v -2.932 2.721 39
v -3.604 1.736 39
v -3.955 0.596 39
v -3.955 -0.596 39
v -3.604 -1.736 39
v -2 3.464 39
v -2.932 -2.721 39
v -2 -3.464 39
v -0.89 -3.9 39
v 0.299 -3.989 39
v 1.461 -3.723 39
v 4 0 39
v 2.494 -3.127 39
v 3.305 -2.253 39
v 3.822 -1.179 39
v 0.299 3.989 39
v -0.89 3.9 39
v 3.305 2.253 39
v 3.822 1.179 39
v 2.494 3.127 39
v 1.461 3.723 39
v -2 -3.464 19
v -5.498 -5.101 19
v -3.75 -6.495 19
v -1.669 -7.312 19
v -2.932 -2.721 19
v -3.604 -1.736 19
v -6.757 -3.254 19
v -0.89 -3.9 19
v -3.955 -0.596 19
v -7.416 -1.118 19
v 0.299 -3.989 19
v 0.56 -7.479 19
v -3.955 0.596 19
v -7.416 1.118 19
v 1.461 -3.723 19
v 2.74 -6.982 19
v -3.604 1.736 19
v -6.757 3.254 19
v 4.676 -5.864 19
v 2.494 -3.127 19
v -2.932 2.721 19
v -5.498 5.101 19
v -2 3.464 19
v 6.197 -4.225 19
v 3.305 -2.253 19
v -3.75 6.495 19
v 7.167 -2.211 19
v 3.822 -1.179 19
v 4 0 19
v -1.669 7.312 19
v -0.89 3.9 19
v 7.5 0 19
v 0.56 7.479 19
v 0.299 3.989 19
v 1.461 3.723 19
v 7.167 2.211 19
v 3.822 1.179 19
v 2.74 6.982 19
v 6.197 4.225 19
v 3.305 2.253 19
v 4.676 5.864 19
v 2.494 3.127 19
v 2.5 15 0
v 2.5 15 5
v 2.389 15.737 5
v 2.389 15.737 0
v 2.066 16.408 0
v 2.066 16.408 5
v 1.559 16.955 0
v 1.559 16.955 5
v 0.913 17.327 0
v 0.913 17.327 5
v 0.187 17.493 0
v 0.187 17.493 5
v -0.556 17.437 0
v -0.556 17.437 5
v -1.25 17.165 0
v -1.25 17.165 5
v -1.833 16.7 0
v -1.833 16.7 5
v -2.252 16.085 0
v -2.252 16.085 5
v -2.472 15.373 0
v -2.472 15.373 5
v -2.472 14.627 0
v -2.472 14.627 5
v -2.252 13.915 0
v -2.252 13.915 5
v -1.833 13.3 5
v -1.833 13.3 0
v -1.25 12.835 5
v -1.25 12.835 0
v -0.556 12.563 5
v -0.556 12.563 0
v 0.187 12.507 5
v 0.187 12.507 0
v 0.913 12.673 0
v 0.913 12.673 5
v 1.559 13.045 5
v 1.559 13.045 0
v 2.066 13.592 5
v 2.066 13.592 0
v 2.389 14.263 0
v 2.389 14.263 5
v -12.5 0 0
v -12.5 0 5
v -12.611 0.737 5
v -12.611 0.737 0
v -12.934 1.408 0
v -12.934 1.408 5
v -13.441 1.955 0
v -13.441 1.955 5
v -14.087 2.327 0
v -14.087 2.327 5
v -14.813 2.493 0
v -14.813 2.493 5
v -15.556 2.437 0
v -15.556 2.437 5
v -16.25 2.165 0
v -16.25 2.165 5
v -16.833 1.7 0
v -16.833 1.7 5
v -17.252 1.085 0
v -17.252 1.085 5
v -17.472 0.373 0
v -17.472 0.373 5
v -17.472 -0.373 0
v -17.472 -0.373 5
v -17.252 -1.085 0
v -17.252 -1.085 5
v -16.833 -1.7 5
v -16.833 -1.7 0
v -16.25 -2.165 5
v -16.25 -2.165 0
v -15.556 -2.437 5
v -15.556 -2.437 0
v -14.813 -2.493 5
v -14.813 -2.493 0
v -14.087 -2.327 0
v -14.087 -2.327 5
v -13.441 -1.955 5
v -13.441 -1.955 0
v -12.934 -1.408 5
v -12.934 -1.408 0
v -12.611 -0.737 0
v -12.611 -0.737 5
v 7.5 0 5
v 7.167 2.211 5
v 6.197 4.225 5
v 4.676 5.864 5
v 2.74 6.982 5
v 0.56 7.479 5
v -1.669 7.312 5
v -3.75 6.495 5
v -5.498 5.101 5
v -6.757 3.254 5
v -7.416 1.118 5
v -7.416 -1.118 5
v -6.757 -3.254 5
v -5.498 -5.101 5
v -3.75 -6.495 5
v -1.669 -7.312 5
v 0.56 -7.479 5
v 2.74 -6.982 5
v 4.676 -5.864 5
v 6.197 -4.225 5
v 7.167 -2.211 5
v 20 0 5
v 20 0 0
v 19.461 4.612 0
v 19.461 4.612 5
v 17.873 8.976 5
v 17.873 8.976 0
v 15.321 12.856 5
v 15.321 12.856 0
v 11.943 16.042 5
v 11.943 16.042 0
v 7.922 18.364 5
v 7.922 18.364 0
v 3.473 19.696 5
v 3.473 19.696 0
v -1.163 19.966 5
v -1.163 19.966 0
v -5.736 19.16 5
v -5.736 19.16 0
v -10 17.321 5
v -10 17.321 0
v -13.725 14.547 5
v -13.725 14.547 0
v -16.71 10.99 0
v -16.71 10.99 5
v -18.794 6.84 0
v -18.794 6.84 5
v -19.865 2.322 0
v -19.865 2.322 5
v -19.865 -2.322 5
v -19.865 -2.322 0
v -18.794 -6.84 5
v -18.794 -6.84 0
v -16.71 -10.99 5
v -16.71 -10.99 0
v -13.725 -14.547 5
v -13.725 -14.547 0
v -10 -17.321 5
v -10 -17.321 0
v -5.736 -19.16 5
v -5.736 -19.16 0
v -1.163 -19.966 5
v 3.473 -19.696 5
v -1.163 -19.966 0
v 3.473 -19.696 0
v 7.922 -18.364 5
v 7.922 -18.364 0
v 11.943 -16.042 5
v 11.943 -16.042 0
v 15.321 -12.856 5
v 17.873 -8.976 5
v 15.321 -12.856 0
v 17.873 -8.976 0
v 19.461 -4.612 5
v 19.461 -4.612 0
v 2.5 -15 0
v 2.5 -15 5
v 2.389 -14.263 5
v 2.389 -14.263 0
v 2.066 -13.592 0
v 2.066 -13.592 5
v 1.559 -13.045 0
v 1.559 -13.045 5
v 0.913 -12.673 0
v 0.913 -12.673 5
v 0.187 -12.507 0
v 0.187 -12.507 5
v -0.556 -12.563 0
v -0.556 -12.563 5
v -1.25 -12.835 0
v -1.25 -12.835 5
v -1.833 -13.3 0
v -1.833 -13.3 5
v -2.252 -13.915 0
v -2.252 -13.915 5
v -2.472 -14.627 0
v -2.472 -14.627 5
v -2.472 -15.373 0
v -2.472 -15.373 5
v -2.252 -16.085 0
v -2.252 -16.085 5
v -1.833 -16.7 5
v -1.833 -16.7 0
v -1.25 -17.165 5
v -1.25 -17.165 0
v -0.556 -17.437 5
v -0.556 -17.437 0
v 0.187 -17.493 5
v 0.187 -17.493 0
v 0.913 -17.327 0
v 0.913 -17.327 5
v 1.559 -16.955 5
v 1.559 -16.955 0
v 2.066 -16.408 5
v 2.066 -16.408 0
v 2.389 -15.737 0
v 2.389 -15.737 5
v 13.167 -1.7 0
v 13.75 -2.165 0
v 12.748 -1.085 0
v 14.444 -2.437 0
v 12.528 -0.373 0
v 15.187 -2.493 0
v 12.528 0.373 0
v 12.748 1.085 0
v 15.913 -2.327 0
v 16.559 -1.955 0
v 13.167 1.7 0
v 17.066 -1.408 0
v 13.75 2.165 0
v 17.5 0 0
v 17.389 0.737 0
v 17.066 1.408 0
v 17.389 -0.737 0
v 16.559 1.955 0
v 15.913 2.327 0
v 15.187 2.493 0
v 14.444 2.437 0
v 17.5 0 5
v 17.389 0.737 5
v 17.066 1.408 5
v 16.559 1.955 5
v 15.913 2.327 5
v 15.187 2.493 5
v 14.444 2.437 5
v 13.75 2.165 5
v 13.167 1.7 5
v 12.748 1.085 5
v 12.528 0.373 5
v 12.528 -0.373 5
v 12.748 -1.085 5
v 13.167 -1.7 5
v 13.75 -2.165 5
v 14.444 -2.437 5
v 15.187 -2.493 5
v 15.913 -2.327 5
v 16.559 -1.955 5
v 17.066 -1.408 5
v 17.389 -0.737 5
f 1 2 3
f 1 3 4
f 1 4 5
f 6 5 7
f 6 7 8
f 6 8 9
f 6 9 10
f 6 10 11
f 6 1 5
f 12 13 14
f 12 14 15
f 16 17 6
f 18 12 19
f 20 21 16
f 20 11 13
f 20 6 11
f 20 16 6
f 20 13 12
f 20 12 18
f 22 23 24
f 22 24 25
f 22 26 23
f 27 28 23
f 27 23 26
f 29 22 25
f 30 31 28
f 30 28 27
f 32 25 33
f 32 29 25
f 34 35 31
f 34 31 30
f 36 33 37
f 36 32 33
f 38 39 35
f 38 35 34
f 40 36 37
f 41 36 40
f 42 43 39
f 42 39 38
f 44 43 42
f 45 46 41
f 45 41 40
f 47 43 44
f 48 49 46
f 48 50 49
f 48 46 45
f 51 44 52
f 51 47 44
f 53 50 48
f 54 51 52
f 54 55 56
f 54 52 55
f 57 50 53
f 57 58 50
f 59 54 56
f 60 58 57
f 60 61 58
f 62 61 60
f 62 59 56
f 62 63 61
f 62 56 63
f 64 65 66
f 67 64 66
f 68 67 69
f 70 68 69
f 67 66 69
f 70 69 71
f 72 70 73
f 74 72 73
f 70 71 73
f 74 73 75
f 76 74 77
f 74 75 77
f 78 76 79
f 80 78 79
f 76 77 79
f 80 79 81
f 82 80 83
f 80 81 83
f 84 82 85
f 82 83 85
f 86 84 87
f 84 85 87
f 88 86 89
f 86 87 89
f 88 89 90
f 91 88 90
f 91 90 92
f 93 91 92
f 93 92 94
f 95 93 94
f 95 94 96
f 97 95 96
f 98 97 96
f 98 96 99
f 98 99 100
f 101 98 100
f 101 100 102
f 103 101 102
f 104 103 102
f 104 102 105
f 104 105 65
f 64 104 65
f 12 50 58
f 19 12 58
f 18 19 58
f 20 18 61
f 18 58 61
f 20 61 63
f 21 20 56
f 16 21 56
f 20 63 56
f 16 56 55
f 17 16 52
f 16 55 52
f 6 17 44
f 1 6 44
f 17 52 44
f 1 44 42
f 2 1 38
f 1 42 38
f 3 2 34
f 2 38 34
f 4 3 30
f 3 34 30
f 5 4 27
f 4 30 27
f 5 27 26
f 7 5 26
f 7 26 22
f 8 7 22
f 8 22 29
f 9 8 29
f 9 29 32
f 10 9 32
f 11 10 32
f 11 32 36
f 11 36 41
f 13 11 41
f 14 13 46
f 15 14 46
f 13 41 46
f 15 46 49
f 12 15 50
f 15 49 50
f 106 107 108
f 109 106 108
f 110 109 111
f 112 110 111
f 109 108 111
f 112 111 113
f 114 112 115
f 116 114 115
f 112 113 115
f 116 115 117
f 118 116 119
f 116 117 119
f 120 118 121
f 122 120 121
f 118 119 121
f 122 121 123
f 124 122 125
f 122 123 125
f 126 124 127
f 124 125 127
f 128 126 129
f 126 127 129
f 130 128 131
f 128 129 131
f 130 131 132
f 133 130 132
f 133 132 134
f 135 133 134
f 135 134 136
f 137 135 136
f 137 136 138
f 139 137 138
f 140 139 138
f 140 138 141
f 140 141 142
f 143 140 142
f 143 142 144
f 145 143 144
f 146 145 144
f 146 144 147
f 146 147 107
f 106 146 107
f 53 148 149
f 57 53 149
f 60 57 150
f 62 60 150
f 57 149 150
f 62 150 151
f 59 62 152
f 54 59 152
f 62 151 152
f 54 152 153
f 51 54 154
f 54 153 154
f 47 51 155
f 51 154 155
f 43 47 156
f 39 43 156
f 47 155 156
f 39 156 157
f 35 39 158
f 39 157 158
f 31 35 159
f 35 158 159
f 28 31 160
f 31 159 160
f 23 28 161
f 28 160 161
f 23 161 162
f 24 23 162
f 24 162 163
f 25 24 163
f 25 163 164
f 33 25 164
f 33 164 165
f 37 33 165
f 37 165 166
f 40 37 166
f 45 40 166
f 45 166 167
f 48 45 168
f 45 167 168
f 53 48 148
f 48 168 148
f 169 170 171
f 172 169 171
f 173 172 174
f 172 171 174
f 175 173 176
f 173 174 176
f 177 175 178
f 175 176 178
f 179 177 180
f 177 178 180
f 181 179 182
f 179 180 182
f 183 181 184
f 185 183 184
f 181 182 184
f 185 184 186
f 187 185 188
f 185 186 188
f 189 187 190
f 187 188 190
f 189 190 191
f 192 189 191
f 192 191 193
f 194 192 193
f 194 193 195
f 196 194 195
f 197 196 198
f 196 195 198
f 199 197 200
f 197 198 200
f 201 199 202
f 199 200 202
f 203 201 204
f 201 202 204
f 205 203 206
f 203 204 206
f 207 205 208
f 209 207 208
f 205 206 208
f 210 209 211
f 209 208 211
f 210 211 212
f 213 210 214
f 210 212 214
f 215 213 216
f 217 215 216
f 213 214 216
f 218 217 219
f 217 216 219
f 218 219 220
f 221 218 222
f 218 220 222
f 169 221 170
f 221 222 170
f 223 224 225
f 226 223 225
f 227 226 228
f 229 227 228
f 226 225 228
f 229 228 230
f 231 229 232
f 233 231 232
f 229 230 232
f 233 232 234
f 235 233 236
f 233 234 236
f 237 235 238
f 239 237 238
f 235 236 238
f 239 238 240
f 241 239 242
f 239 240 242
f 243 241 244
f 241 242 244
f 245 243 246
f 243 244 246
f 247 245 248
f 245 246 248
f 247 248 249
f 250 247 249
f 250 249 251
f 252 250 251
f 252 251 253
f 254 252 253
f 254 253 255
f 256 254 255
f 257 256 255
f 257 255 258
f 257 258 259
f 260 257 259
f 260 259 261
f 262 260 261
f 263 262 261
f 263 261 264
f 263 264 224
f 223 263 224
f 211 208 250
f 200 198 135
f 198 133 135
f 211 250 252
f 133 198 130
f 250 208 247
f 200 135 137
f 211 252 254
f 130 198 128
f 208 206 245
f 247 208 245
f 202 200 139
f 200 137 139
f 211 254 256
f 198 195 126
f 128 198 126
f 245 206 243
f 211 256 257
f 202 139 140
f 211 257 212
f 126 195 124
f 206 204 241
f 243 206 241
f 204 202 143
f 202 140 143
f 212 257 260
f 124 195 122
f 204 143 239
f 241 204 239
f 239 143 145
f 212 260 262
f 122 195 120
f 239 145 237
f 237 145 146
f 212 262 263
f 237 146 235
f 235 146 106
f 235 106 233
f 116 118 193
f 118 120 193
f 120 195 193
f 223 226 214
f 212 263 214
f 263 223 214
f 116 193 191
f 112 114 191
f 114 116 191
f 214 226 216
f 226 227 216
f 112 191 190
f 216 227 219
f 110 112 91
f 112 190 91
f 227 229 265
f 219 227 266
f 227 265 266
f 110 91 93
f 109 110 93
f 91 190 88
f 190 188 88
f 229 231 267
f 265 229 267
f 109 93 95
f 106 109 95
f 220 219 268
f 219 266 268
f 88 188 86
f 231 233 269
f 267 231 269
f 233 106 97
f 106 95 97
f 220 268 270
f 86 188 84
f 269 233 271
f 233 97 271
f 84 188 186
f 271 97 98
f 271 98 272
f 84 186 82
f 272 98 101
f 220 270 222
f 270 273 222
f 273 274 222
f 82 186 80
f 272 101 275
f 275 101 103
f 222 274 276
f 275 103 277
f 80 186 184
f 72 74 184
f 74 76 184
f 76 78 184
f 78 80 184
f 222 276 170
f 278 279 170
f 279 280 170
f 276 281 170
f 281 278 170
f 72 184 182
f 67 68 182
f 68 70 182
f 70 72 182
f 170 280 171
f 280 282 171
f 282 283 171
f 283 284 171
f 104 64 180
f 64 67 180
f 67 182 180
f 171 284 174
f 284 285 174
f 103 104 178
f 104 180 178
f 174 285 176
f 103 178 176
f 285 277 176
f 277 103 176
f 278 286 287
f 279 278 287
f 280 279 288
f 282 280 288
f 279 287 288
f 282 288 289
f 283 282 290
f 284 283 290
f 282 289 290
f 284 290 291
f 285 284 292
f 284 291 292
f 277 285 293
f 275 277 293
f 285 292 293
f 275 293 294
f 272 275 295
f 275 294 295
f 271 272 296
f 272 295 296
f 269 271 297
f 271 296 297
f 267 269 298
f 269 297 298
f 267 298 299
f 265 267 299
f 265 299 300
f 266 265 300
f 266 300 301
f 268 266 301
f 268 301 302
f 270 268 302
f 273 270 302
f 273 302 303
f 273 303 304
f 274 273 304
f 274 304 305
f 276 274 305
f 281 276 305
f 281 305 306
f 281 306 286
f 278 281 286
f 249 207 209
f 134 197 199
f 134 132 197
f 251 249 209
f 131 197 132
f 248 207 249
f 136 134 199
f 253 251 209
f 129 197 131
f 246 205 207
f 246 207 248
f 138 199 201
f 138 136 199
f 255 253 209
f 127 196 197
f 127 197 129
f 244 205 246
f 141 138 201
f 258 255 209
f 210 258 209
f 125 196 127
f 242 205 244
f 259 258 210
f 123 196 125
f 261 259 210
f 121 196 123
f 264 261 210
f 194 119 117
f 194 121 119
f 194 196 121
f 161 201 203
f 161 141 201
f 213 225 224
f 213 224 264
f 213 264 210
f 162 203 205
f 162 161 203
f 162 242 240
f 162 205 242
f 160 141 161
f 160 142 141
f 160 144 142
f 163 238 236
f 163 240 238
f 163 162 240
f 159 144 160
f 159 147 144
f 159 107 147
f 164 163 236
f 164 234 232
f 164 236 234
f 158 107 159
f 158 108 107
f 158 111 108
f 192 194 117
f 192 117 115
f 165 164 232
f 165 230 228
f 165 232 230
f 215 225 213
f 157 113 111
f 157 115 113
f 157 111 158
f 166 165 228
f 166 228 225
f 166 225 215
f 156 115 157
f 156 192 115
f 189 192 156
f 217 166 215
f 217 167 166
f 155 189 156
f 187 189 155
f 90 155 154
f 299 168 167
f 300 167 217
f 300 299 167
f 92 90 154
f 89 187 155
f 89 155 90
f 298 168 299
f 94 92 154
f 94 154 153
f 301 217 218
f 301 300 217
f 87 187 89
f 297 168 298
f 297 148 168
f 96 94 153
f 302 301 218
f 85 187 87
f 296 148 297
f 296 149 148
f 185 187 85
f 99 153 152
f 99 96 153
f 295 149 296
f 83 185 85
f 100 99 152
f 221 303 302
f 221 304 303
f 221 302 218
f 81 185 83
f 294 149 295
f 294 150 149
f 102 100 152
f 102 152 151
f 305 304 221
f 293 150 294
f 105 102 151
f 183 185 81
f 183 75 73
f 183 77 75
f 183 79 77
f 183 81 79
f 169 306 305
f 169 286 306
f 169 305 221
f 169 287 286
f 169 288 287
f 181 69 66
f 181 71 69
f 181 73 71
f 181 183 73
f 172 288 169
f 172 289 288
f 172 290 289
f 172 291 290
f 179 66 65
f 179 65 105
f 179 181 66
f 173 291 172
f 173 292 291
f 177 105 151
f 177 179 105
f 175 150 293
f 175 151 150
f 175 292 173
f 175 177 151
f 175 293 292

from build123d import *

# Parameters (mm, degrees)
SKETCH1_R           = 20
BOSS_EXTRUDE1_DEPTH = 5
SKETCH2_R           = 7.5
BOSS_EXTRUDE2_DEPTH = 14
SKETCH3_R           = 4
BOSS_EXTRUDE3_DEPTH = 20
SKETCH4_R           = 2.5
CUT_EXTRUDE1_DEPTH  = 20


with BuildPart() as part:
    # Sketch1 → Boss-Extrude1 (new body)
    with BuildSketch(Plane.XY):
        Circle(SKETCH1_R)
    extrude(amount=BOSS_EXTRUDE1_DEPTH)

    # Sketch2 → Boss-Extrude2 (add)
    with BuildSketch(Plane.XY.offset(5)):
        Circle(SKETCH2_R)
    extrude(amount=BOSS_EXTRUDE2_DEPTH)

    # Sketch3 → Boss-Extrude3 (add)
    with BuildSketch(Plane.XY.offset(19)):
        Circle(SKETCH3_R)
    extrude(amount=BOSS_EXTRUDE3_DEPTH)

    # Sketch4 → Cut-Extrude1 (cut)
    with BuildSketch(Plane.XY.offset(5)):
        with Locations((0, 15)):
            Circle(SKETCH4_R)
        with Locations((15, 0)):
            Circle(SKETCH4_R)
        with Locations((0, -15)):
            Circle(SKETCH4_R)
        with Locations((-15, 0)):
            Circle(SKETCH4_R)
    extrude(amount=-CUT_EXTRUDE1_DEPTH, mode=Mode.SUBTRACT)


solid = part.part
